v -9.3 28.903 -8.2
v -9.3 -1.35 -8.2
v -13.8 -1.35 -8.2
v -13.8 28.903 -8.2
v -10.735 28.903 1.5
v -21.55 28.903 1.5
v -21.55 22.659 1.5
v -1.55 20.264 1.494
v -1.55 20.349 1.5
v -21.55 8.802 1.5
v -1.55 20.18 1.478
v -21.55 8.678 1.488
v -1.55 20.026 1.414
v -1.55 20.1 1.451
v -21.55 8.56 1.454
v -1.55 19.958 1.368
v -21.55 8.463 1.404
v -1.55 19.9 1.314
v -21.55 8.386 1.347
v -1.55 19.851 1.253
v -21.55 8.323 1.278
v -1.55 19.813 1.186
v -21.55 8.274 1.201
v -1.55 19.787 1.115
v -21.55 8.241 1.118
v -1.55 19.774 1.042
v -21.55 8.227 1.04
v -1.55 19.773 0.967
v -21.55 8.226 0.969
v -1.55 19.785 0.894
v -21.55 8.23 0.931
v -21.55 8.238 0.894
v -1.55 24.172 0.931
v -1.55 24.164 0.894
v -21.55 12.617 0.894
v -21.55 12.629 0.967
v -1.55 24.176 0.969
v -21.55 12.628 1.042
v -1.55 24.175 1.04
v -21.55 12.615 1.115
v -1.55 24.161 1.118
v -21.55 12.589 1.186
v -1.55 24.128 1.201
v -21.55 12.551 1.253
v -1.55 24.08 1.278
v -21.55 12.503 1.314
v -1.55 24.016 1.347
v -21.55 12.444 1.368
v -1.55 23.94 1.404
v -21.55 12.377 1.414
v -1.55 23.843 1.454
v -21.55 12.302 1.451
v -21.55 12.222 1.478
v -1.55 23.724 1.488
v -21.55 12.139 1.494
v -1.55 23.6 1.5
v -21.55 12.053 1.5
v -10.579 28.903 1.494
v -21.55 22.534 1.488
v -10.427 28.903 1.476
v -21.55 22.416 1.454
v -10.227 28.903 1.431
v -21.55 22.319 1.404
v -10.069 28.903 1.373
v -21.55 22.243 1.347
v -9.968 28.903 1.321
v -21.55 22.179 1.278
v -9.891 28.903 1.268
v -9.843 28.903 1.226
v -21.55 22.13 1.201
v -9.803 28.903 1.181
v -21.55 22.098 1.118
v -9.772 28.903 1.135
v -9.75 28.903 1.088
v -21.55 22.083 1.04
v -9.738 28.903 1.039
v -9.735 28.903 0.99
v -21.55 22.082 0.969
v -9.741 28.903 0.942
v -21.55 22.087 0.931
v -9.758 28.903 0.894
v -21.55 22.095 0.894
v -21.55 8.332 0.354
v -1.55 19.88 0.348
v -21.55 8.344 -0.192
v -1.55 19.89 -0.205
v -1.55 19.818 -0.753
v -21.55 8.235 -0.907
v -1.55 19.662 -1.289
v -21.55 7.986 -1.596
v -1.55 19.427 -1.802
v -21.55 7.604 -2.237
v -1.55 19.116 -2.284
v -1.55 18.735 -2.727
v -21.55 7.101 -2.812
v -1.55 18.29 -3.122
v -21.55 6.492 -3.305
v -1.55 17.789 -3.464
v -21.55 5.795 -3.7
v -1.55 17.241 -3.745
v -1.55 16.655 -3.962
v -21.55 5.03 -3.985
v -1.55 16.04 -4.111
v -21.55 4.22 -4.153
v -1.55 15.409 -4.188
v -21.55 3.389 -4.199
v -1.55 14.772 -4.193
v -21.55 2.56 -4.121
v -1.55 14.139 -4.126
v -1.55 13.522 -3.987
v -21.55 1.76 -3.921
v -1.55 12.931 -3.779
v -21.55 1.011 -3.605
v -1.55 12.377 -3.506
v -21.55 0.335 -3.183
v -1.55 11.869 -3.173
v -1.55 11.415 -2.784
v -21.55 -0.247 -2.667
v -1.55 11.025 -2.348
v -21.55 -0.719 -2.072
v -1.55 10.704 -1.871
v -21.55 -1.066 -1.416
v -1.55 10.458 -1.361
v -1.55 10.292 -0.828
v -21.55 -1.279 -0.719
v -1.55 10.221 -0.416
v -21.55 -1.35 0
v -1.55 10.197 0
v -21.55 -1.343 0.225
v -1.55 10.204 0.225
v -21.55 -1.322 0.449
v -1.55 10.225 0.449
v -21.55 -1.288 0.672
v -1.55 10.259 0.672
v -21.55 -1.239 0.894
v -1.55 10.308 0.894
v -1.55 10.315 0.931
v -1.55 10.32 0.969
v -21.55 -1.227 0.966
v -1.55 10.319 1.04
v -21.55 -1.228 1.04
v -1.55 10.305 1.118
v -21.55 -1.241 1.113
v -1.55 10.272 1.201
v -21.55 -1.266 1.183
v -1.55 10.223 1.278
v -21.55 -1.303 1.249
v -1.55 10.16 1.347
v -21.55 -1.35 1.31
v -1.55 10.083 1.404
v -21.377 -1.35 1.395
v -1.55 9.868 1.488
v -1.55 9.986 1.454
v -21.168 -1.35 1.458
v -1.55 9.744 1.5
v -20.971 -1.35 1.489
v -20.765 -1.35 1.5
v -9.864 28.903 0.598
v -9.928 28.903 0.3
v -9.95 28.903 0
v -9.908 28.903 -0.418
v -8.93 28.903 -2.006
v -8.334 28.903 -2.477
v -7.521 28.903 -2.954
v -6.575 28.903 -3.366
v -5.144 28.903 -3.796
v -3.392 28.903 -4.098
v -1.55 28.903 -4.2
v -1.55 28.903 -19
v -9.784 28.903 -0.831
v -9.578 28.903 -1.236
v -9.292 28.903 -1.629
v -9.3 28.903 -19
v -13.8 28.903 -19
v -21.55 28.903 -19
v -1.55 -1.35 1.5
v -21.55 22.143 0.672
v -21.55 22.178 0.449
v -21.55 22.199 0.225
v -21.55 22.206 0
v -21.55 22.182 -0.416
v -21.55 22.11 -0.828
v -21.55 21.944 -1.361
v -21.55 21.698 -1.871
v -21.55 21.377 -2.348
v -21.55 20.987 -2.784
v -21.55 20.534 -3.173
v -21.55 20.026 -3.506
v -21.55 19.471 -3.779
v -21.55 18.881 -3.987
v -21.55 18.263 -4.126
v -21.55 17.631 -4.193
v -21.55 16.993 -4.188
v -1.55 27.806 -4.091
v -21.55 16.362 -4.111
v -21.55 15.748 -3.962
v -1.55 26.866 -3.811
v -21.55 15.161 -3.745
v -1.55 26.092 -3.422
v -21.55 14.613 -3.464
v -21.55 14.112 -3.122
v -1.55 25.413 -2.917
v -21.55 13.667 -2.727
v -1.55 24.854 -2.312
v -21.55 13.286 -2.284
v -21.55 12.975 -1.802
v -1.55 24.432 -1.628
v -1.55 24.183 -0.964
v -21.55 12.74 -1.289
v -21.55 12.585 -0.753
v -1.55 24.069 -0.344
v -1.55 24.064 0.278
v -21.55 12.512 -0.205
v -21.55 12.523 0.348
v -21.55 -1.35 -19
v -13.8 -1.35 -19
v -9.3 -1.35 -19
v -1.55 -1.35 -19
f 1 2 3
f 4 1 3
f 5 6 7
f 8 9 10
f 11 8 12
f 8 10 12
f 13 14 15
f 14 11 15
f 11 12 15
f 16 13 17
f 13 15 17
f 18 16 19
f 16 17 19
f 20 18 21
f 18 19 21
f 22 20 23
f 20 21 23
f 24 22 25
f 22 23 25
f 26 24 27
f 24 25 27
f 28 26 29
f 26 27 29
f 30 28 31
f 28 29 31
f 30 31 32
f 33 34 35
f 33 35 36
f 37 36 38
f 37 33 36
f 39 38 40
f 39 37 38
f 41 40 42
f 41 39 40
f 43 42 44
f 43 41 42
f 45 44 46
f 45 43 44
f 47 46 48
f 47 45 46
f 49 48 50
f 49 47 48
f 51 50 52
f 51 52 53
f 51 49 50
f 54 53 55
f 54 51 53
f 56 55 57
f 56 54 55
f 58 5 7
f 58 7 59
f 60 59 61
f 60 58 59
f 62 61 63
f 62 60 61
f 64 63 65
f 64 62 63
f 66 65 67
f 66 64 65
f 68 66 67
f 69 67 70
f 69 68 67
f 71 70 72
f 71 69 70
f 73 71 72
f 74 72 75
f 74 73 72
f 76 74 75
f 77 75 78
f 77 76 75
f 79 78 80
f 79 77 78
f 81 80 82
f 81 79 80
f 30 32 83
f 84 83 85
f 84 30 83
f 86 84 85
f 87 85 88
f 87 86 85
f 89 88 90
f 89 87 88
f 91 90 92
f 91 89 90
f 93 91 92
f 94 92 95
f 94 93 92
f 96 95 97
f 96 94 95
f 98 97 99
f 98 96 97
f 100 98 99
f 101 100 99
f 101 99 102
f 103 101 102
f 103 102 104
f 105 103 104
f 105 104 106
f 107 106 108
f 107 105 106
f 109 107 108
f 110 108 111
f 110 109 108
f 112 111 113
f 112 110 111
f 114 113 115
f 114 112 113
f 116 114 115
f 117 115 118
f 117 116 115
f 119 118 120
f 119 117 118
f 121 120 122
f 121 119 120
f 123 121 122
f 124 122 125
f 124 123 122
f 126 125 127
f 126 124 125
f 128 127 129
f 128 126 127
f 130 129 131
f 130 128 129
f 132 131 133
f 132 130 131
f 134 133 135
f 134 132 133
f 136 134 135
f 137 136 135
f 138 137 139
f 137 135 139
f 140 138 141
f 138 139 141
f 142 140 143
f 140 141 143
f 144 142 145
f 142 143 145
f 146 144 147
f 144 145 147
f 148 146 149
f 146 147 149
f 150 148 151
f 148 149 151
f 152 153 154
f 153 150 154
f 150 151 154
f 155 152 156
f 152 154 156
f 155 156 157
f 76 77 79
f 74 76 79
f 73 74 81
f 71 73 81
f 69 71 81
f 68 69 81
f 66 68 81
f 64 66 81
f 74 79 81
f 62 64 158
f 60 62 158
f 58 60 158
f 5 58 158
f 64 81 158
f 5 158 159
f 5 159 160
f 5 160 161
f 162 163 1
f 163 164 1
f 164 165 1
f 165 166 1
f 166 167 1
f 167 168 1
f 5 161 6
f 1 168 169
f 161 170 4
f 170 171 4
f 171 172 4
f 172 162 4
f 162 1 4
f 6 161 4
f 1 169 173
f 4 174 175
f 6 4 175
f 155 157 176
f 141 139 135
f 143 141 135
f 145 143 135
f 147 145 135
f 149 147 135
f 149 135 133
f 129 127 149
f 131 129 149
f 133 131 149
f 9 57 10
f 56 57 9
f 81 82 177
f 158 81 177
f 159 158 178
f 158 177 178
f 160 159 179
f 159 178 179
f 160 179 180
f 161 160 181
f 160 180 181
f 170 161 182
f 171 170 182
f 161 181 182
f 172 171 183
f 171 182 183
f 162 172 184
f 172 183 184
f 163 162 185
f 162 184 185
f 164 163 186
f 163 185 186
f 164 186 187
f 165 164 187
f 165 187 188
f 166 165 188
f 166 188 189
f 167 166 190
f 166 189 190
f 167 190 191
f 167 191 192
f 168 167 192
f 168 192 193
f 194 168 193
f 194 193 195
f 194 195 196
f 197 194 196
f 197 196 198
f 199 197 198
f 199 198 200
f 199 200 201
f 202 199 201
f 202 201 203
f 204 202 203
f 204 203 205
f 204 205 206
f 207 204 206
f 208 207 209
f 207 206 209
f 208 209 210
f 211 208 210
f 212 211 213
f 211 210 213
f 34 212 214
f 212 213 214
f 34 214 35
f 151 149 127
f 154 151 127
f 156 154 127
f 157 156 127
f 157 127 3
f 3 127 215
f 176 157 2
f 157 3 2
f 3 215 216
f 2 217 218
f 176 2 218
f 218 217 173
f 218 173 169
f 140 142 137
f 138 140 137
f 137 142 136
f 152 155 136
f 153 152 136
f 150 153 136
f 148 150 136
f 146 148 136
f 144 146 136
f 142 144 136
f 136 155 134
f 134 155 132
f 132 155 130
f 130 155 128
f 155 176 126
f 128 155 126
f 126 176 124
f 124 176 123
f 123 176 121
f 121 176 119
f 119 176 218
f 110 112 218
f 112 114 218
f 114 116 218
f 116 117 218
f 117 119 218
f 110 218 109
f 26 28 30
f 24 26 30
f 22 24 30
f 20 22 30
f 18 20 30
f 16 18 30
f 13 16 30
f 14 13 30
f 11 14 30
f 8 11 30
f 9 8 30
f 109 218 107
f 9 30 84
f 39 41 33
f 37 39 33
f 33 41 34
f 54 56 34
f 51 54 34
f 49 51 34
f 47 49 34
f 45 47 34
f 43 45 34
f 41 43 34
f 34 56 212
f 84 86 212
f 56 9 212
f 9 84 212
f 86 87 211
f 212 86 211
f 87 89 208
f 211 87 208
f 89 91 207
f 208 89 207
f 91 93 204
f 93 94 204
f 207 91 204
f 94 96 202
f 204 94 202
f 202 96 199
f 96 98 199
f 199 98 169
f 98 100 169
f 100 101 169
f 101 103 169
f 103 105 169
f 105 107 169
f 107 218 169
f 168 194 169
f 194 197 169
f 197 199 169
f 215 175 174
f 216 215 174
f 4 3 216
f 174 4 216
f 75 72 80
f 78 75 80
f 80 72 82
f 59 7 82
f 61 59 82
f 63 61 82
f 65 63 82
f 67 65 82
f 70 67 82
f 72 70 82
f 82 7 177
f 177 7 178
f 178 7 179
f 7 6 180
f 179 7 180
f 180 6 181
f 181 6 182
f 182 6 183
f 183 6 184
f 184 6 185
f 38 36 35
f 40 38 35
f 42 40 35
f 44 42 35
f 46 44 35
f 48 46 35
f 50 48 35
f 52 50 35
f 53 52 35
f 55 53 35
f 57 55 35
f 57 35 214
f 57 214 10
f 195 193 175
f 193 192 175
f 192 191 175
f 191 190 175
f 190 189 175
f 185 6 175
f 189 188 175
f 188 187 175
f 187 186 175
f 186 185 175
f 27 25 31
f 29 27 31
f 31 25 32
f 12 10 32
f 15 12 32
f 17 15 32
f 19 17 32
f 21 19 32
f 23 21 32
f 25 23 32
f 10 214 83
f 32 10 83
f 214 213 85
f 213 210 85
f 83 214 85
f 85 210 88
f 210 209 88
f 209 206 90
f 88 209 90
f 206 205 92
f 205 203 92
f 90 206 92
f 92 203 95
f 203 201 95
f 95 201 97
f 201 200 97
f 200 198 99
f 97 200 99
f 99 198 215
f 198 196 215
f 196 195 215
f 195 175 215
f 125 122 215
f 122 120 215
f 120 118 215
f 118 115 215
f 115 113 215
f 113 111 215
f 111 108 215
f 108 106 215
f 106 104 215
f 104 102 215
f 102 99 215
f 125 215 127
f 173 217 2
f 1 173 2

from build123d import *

# Parameters (mm, degrees)
F1_DEPTH      = 24
F1_DEPTH_BACK = 1.5
F4_T1_DEPTH   = 17.3810892057
F4_T3_DEPTH   = 26.4408905281
F4_T5_DEPTH   = 26.4408905281
F4_T7_DEPTH   = 26.4408905281
F6_DEPTH      = 43.7
F7_DEPTH      = 5


# Not quite as in the source:
# - a fillet or chamfer that OpenCascade refuses, or shapes differently, is made with other operations: its cross-section is extruded or revolved along the edge and cut away or added
# - a feature names something its author has since deleted; it is built from what else it names


with BuildPart() as f1:
    # F0 (on Top) → F1 (new body, two sides)
    with BuildSketch(Plane.XY) as f1_sk:
        Polygon((-9.9499136187, 28.9028368274), (-21.5499136187, 28.9028368274), (-21.5499136187, 22.2055737048), align=None)
        Polygon((-1.5499136187, 28.9028368274), (-9.9499136187, 28.9028368274), (-21.5499136187, 22.2055737048), (-21.5499136187, 17.3558314436), align=None)
        Polygon((-1.5499136187, 21.9746335971), (-1.5499136187, 28.9028368274), (-21.5499136187, 17.3558314436), (-21.5499136187, 10.4276282133), align=None)
        Polygon((-1.5499136187, 15.0464303668), (-1.5499136187, 21.9746335971), (-21.5499136187, 10.4276282133), (-21.5499136187, 3.499424983), align=None)
        Polygon((-1.5499136187, -1.3503172782), (-1.5499136187, 10.1966881056), (-21.5499136187, -1.3503172782), align=None)
        Polygon((-1.5499136187, 10.1966881056), (-1.5499136187, 15.0464303668), (-21.5499136187, 3.499424983), (-21.5499136187, -1.3503172782), align=None)
    extrude(amount=-F1_DEPTH)
    extrude(f1_sk.sketch, amount=F1_DEPTH_BACK)

    # F0 (on Top) → F2 (revolve, cut)
    with BuildSketch(Plane.XY):
        Polygon((-21.5499136187, 17.3558314436), (-21.5499136187, 22.2055737048), (-34.8505816362, 14.5264294445), (-32.7505816362, 10.8891227486), align=None)
        Polygon((-1.5499136187, 28.9028368274), (-9.9499136187, 28.9028368274), (-21.5499136187, 22.2055737048), (-21.5499136187, 17.3558314436), align=None)
        Polygon((0, 34.6474221335), (-9.9499136187, 28.9028368274), (-1.5499136187, 28.9028368274), (2.1, 31.0101154376), align=None)
    revolve(axis=Axis((-15.3252908181, 20.9496190931, 0), (-0.8660254038, -0.5, 0)), mode=Mode.SUBTRACT)

    # F0 (on Top) → F3 (revolve, cut)
    with BuildSketch(Plane.XY):
        Polygon((-21.5499136187, -1.3503172782), (-21.5499136187, 3.499424983), (-26.7505816362, 0.4968179032), (-24.6505816362, -3.1404887927), align=None)
        Polygon((-1.5499136187, 10.1966881056), (-1.5499136187, 15.0464303668), (-21.5499136187, 3.499424983), (-21.5499136187, -1.3503172782), align=None)
        Polygon((8.1, 20.6178105922), (-1.5499136187, 15.0464303668), (-1.5499136187, 10.1966881056), (10.2, 16.9805038963), align=None)
    revolve(axis=Axis((-9.3252908181, 10.5573142477, 0), (-0.8660254038, -0.5, 0)), mode=Mode.SUBTRACT)

    # F4: fillet of radius 0.5 on 4 edges, made by hand

    # F4_s2 → F4_t1 (cut)
    with BuildSketch(Plane(origin=(6.9175881272, 3.9938713674, 0), x_dir=(0, 0, 1), z_dir=(-0.8660254038, -0.5, 0))):
        with BuildLine():
            ThreePointArc((1.5, 30.3979327446), (1.3136945255, 30.0085797625), (0.8936170213, 29.9093811487))
            ThreePointArc((0.8936170213, 29.9093811487), (1.2002187189, 29.8304048869), (1.5, 29.7285567925))
            Line((1.5, 29.7285567925), (1.5, 30.3979327446))
        make_face()
    extrude(amount=F4_T1_DEPTH, mode=Mode.SUBTRACT)

    # F4_s4 → F4_t3 (cut)
    with BuildSketch(Plane(origin=(10.8405971764, 6.258821698, 0), x_dir=(0, 0, 1), z_dir=(-0.8660254038, -0.5, 0))):
        with BuildLine():
            ThreePointArc((0.8936170213, 21.7017143379), (1.3136945255, 21.6025157241), (1.5, 21.213162742))
            Line((1.5, 21.213162742), (1.5, 21.8825386941))
            ThreePointArc((1.5, 21.8825386941), (1.2002187189, 21.7806905996), (0.8936170213, 21.7017143379))
        make_face()
    extrude(amount=F4_T3_DEPTH, mode=Mode.SUBTRACT)

    # F4_s6 → F4_t5 (cut)
    with BuildSketch(Plane(origin=(-14.1348766704, -8.1607748506, 0), x_dir=(0, 0, 1), z_dir=(0.8660254038, 0.5, 0))):
        with BuildLine():
            ThreePointArc((1.5, -18.3979327446), (1.3136945255, -18.0085797625), (0.8936170213, -17.9093811487))
            ThreePointArc((0.8936170213, -17.9093811487), (1.2002187189, -17.8304048869), (1.5, -17.7285567925))
            Line((1.5, -17.7285567925), (1.5, -18.3979327446))
        make_face()
    extrude(amount=F4_T5_DEPTH, mode=Mode.SUBTRACT)

    # F4_s8 → F4_t7 (cut)
    with BuildSketch(Plane(origin=(-18.0578857196, -10.4257251812, 0), x_dir=(0, 0, 1), z_dir=(0.8660254038, 0.5, 0))):
        with BuildLine():
            ThreePointArc((0.8936170213, -9.7017143379), (1.3136945255, -9.6025157241), (1.5, -9.213162742))
            Line((1.5, -9.213162742), (1.5, -9.8825386941))
            ThreePointArc((1.5, -9.8825386941), (1.2002187189, -9.7806905996), (0.8936170213, -9.7017143379))
        make_face()
    extrude(amount=F4_T7_DEPTH, mode=Mode.SUBTRACT)

    # F5 (on face) → F6 (cut)
    with BuildSketch(Plane.XZ.offset(1.3503172782)):
        Polygon((-13.7999136187, -26.7), (-9.2999136187, -26.7), (-9.8499136187, -24), (-13.2499136187, -24), align=None)
        Polygon((-9.8499136187, -24), (-9.2999136187, -24), (-9.2999136187, -8.2), (-13.7999136187, -8.2), (-13.7999136187, -24), (-13.2499136187, -24), align=None)
    extrude(amount=-F6_DEPTH, mode=Mode.SUBTRACT)

    # F7 (cut): faces of the model
    f7_faces = [f1.faces().sort_by_distance(p)[0] for p in [
        (-17.6749136187, 13.7762597746, -24),
        (-5.4249136187, 13.7762597746, -24),
    ]]
    extrude(f7_faces, amount=-F7_DEPTH, mode=Mode.SUBTRACT)


solid = f1.part
